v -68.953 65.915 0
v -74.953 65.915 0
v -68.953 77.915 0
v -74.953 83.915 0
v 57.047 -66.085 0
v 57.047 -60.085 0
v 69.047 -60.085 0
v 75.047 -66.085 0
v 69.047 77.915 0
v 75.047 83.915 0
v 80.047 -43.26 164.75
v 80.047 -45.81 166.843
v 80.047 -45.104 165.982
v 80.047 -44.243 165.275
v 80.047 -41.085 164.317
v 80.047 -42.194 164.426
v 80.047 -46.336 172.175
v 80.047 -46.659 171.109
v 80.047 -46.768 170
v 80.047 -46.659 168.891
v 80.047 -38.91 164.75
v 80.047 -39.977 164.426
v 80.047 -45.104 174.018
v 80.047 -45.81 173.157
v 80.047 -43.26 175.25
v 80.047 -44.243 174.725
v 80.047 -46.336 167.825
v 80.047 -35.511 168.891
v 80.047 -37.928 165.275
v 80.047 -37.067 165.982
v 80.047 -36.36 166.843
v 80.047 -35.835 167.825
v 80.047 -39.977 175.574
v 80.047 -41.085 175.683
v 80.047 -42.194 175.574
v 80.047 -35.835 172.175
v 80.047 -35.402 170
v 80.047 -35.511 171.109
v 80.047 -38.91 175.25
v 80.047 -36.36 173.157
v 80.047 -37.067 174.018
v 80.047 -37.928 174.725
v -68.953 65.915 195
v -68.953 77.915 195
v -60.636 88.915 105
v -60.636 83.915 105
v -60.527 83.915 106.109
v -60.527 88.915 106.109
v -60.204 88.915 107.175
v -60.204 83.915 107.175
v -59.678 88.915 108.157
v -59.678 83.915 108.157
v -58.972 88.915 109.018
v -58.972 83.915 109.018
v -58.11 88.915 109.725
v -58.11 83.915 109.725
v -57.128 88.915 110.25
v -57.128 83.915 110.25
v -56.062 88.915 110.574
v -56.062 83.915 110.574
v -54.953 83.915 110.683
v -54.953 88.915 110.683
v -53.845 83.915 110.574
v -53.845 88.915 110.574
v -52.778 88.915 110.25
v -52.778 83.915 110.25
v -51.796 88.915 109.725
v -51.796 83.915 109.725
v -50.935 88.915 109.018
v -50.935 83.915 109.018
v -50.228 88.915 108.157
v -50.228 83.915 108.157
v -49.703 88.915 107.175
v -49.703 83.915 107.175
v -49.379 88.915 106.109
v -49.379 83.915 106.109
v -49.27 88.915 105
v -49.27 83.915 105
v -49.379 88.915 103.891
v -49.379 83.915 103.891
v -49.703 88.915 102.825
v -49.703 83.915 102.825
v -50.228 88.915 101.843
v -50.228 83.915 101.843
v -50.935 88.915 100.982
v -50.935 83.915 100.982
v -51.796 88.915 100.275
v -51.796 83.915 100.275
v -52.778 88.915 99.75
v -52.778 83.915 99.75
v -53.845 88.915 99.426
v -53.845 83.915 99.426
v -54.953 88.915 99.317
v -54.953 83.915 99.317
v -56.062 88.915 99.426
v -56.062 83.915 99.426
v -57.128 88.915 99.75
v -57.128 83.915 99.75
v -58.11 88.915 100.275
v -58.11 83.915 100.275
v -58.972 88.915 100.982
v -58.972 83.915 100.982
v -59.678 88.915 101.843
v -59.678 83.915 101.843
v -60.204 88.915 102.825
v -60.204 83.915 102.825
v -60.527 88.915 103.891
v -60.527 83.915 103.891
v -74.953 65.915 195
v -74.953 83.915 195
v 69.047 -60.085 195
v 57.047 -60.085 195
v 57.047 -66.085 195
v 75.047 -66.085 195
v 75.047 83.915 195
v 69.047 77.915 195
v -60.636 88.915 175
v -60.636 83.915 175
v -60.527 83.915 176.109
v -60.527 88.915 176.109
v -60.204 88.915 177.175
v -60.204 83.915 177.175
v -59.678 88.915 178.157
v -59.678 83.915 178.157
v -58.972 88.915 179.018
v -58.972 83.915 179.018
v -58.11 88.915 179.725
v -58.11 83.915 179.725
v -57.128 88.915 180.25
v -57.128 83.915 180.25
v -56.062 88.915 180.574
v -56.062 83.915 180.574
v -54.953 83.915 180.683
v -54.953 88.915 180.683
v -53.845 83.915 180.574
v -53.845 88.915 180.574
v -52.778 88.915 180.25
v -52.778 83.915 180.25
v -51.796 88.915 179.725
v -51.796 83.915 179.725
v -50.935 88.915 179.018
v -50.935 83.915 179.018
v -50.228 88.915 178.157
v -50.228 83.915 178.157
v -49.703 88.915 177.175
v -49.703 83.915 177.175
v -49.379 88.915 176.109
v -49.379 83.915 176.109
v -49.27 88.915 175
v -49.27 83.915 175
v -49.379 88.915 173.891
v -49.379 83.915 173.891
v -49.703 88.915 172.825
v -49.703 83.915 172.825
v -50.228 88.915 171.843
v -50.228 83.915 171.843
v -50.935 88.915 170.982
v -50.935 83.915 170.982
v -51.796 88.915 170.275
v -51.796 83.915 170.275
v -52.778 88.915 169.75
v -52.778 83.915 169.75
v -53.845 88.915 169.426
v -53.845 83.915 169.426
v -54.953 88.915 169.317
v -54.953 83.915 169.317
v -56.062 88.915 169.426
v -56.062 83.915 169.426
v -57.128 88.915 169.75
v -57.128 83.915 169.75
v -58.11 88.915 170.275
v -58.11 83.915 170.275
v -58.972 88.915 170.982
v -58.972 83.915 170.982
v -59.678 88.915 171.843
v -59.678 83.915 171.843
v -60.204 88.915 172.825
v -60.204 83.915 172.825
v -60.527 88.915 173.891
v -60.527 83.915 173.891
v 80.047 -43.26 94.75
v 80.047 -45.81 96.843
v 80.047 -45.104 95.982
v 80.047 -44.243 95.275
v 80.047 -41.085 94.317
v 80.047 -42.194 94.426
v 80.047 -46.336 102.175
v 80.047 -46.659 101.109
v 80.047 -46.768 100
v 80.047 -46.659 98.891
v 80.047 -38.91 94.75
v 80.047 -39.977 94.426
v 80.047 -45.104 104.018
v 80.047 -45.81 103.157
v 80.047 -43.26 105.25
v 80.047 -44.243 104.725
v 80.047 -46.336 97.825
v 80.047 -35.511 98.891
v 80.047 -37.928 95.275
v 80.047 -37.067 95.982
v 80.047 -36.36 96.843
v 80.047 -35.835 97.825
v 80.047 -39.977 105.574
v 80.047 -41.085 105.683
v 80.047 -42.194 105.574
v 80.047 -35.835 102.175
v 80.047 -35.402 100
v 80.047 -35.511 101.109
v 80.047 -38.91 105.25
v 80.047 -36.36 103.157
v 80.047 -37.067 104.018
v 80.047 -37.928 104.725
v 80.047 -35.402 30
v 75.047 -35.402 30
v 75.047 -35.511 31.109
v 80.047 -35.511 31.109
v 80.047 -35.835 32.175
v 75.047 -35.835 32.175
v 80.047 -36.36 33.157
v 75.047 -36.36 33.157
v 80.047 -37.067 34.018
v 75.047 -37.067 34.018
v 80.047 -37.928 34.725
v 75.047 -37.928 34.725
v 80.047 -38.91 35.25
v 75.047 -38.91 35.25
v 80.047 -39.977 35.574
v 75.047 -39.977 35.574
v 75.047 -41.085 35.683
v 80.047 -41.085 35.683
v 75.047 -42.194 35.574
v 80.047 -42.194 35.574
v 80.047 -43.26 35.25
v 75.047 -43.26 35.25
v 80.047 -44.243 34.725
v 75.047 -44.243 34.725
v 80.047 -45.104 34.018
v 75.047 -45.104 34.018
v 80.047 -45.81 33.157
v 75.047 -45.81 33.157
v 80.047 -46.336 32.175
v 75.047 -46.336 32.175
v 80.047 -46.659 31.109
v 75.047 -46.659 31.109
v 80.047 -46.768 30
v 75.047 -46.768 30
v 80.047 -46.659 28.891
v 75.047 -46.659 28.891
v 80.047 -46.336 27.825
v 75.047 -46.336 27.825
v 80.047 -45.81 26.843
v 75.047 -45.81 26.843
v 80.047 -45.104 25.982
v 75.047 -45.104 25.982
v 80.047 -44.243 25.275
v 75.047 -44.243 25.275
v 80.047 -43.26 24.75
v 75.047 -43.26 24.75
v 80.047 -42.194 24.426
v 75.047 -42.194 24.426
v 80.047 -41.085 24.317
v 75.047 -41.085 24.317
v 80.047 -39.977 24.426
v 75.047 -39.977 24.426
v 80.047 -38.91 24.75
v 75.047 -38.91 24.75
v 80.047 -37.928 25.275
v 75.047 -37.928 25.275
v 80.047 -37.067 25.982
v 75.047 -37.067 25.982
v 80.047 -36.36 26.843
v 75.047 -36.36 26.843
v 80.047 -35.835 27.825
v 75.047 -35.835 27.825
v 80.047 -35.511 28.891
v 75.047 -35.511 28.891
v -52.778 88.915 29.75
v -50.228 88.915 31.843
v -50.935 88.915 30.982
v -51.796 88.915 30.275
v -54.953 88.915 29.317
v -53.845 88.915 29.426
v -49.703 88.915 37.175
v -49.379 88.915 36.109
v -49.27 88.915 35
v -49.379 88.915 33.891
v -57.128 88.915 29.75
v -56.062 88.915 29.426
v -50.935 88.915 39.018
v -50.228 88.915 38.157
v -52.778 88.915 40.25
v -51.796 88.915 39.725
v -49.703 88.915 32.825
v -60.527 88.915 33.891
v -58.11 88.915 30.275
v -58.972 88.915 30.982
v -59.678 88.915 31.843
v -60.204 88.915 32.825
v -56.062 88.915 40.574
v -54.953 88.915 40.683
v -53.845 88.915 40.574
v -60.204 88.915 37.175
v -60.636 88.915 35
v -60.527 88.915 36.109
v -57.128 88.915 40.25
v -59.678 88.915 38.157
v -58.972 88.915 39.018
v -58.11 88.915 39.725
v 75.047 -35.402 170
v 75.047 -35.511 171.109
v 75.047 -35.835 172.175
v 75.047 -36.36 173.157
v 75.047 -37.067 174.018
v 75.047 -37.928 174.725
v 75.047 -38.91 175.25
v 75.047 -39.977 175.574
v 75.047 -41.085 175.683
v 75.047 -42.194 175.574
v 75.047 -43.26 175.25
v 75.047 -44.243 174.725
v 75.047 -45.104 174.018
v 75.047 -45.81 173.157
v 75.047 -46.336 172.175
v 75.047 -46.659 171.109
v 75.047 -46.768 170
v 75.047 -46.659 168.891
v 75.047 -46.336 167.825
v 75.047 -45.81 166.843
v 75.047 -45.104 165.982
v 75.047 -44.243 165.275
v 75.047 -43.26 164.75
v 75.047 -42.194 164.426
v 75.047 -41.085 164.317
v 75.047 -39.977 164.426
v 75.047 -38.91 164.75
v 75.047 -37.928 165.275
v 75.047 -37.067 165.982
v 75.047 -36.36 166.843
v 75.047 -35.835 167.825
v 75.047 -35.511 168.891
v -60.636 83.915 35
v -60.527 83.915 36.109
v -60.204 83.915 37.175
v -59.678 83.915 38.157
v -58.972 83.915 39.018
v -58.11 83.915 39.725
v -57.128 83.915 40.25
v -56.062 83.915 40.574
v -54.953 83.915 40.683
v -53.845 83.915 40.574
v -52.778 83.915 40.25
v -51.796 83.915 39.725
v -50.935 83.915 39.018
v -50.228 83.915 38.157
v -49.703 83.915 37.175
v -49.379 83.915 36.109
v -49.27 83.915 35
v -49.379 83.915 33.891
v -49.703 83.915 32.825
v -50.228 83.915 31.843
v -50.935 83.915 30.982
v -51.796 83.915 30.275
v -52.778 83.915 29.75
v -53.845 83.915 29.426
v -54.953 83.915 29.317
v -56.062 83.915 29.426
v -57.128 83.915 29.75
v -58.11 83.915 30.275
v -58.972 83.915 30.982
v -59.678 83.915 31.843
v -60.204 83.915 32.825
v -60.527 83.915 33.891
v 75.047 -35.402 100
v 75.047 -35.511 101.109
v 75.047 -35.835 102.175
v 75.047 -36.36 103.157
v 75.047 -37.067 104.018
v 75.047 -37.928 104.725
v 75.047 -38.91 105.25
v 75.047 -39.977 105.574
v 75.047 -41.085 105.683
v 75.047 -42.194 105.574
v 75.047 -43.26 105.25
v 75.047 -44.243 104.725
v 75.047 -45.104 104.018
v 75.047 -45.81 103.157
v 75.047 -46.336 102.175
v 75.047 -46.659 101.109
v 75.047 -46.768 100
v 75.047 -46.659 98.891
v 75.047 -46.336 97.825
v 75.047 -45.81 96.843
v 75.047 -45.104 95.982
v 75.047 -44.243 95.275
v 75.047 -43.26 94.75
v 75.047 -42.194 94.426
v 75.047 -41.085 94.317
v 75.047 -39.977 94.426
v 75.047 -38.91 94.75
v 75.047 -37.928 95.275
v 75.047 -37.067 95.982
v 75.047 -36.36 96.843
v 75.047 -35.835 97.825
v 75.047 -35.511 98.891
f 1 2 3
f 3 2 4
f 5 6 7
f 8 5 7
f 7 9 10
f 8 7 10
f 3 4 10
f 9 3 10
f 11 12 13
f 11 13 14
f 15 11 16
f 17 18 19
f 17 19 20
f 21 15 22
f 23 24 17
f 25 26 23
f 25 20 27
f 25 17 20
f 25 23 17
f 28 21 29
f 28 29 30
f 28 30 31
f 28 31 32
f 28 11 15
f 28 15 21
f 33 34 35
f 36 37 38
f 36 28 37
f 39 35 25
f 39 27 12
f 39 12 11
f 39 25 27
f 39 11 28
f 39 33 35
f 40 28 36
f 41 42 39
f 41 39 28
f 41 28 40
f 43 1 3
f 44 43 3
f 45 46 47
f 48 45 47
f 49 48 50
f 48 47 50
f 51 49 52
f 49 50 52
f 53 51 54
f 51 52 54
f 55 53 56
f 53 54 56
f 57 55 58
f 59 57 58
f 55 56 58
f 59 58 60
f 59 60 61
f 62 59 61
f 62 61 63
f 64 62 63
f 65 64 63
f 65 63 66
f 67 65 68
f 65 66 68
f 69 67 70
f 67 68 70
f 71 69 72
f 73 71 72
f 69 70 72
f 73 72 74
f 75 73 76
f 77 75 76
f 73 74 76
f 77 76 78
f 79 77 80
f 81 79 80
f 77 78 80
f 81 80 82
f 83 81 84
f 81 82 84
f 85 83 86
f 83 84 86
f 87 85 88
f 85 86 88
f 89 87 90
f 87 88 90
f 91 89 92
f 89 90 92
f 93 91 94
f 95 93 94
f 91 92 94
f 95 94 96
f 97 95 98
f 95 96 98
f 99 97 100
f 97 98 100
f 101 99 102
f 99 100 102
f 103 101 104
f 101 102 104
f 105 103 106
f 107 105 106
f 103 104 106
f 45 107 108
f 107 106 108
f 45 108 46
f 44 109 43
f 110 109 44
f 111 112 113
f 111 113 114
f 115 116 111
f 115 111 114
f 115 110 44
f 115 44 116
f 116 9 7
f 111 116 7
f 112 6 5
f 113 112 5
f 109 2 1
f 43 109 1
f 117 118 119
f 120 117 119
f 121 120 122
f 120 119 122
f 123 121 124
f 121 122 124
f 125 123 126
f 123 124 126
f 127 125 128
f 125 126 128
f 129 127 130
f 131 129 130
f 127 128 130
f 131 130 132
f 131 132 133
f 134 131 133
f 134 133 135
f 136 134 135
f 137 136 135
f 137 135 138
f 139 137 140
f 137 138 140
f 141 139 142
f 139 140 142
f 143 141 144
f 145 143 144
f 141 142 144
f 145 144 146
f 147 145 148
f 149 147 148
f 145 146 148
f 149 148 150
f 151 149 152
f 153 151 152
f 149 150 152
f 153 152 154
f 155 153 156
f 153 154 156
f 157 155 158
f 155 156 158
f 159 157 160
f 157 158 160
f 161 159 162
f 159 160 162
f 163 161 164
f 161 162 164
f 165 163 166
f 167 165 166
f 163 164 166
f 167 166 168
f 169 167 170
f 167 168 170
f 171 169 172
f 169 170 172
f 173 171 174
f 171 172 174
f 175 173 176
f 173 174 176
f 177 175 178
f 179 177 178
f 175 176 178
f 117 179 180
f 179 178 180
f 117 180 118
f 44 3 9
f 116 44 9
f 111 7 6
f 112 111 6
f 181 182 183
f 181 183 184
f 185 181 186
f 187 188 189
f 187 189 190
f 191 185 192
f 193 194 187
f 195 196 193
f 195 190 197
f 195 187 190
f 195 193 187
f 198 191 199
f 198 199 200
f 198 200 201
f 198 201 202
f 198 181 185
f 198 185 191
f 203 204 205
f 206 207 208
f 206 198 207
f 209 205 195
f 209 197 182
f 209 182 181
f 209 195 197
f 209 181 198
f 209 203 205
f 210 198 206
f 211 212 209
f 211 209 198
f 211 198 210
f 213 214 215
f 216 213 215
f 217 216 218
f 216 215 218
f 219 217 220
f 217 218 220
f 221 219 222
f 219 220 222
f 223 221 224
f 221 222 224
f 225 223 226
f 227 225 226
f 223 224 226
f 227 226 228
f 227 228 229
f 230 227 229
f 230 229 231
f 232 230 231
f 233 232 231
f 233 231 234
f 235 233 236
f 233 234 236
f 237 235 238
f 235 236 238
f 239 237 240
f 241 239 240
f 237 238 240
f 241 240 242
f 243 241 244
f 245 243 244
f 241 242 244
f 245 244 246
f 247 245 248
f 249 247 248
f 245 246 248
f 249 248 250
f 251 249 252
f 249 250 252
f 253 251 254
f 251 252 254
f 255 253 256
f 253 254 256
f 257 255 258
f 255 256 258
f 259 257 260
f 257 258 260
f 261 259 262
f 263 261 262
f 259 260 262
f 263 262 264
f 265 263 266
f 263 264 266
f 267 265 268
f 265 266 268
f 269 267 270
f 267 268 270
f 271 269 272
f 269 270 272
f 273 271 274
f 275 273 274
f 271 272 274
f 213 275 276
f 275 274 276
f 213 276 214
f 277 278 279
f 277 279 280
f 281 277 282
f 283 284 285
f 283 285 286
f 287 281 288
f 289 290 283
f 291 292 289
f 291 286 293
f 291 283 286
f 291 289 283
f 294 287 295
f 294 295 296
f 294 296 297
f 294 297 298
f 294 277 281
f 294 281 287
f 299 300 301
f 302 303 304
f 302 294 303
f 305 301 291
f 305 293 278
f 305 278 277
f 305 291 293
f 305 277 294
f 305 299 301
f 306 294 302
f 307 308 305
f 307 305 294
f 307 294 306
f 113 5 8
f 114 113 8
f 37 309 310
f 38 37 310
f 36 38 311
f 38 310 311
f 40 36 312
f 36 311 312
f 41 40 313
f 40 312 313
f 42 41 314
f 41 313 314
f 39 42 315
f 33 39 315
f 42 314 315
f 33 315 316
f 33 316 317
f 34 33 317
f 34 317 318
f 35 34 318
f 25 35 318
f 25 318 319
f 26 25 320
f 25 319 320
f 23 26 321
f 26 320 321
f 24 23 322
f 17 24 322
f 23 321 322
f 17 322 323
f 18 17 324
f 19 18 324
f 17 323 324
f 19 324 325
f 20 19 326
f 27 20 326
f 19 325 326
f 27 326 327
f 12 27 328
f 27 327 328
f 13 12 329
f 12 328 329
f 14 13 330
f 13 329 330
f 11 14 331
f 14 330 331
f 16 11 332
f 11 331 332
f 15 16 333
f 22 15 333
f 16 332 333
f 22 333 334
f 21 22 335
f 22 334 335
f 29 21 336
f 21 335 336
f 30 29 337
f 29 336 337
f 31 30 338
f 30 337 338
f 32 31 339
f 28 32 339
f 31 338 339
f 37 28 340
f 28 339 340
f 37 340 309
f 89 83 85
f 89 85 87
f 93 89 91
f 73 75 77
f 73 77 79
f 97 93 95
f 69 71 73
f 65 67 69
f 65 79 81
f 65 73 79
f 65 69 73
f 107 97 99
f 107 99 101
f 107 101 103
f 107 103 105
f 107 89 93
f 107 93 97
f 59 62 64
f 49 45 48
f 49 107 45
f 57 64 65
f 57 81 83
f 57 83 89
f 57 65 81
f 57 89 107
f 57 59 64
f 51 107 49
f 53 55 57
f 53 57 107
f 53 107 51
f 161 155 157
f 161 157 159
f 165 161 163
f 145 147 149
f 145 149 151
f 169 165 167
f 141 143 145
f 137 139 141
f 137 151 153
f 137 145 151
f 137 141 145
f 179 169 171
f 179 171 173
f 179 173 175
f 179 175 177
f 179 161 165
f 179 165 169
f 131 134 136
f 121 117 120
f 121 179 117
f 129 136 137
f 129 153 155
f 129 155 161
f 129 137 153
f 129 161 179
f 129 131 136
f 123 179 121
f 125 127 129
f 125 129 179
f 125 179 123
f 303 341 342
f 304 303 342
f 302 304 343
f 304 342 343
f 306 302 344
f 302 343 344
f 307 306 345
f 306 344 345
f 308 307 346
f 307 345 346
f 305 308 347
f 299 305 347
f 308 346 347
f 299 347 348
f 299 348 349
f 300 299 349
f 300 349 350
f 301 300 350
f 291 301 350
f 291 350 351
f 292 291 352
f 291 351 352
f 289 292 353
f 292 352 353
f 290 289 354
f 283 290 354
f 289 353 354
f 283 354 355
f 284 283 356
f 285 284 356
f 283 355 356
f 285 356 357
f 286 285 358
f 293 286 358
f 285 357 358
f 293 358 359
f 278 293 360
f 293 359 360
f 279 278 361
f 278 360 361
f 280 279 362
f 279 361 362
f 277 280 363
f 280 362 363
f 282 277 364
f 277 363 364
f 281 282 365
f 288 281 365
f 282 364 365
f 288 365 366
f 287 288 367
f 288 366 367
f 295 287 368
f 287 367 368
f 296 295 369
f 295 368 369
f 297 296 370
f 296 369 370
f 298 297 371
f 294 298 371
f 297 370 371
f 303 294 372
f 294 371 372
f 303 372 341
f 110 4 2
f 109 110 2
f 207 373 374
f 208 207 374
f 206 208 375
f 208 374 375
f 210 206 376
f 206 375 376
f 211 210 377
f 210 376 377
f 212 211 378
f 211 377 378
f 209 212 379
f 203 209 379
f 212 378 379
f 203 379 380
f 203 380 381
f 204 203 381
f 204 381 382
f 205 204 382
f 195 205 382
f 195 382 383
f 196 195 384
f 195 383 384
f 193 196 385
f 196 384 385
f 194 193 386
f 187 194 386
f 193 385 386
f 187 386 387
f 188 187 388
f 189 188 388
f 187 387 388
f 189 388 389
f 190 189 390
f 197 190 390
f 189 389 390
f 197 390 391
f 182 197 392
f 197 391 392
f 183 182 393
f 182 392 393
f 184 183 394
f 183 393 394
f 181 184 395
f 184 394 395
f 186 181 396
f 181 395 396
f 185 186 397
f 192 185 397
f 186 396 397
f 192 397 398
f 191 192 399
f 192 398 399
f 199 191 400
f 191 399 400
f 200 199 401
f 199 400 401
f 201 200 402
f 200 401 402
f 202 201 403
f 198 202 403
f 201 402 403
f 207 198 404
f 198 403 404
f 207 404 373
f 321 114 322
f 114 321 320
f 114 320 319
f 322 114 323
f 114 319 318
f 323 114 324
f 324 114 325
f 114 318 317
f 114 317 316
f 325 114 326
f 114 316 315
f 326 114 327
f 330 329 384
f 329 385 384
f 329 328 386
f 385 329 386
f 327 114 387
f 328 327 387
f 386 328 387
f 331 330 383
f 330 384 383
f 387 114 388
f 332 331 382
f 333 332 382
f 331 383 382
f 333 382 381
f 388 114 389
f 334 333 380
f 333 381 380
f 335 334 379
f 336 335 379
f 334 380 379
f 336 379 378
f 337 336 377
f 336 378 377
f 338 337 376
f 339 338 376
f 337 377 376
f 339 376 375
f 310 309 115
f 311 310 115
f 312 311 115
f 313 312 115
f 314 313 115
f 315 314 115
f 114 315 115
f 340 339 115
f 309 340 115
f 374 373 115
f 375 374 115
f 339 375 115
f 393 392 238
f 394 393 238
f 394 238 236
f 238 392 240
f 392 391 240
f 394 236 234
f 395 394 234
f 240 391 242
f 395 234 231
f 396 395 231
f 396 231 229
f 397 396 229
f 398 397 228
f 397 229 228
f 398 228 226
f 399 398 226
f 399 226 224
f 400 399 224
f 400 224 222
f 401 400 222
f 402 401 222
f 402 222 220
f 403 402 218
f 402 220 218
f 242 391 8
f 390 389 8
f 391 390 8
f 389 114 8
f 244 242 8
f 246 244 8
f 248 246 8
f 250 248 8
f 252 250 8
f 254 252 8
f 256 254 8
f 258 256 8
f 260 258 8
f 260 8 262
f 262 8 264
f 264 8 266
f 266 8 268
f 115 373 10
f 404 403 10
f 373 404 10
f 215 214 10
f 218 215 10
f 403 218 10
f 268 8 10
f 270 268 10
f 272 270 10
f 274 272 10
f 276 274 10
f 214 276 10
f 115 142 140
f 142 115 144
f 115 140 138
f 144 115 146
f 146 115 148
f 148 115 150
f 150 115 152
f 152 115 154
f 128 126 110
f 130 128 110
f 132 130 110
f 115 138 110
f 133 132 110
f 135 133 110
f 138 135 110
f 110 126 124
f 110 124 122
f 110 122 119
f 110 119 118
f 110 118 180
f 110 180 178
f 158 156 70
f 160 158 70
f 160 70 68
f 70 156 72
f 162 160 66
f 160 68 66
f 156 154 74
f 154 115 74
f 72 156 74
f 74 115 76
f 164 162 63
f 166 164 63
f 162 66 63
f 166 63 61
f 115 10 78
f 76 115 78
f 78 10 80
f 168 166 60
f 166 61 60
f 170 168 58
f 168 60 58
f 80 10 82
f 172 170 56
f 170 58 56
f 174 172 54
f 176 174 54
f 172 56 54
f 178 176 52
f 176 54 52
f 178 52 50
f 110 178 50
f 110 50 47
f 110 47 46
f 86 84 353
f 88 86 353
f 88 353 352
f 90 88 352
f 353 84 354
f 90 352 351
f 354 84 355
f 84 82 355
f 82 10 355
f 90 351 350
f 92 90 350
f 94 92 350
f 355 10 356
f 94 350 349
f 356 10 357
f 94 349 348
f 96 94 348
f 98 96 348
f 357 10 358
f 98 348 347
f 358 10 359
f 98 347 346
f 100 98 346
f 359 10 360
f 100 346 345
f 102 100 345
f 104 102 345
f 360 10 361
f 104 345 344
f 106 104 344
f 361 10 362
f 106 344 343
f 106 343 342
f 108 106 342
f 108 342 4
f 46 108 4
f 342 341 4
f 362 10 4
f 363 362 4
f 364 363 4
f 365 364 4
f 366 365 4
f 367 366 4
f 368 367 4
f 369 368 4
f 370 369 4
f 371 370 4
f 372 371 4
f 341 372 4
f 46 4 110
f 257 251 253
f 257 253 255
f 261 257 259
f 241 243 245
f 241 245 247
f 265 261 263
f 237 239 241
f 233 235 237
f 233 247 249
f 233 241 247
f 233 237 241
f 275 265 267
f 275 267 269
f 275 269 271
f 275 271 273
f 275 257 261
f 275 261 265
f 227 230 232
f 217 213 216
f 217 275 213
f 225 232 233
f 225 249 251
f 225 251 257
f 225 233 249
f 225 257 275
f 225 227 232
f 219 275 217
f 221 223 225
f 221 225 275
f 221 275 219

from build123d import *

# Parameters (mm, degrees)
F1_DEPTH = 195
F2_R     = 5.682985
F3_DEPTH = 5
F4_R     = 5.682985
F5_DEPTH = 5


with BuildPart() as f1:
    # F0 (on Top) → F1 (new body)
    with BuildSketch(Plane.XY):
        Polygon((75.046803, 83.914765), (-74.953197, 83.914765), (-74.953197, 65.914765), (-68.953197, 65.914765), (-68.953197, 77.914765), (69.046803, 77.914765), (69.046803, -60.085235), (57.046803, -60.085235), (57.046803, -66.085235), (75.046803, -66.085235), align=None)
    extrude(amount=F1_DEPTH)

    # F2 (on face) → F3 (join)
    with BuildSketch(Plane.YZ.offset(75.046803)):
        with Locations((-41.085235, 170)):
            Circle(F2_R)
        with Locations((-41.085235, 100)):
            Circle(F2_R)
        with Locations((-41.085235, 30)):
            Circle(F2_R)
    extrude(amount=F3_DEPTH)

    # F4 (on face) → F5 (join)
    with BuildSketch(Plane(origin=(0, 83.914765, 0), x_dir=(-1, 0, 0), z_dir=(0, 1, 0))):
        with Locations((54.953197, 175)):
            Circle(F4_R)
        with Locations((54.953197, 105)):
            Circle(F4_R)
        with Locations((54.953197, 35)):
            Circle(F4_R)
    extrude(amount=F5_DEPTH)


solid = f1.part
